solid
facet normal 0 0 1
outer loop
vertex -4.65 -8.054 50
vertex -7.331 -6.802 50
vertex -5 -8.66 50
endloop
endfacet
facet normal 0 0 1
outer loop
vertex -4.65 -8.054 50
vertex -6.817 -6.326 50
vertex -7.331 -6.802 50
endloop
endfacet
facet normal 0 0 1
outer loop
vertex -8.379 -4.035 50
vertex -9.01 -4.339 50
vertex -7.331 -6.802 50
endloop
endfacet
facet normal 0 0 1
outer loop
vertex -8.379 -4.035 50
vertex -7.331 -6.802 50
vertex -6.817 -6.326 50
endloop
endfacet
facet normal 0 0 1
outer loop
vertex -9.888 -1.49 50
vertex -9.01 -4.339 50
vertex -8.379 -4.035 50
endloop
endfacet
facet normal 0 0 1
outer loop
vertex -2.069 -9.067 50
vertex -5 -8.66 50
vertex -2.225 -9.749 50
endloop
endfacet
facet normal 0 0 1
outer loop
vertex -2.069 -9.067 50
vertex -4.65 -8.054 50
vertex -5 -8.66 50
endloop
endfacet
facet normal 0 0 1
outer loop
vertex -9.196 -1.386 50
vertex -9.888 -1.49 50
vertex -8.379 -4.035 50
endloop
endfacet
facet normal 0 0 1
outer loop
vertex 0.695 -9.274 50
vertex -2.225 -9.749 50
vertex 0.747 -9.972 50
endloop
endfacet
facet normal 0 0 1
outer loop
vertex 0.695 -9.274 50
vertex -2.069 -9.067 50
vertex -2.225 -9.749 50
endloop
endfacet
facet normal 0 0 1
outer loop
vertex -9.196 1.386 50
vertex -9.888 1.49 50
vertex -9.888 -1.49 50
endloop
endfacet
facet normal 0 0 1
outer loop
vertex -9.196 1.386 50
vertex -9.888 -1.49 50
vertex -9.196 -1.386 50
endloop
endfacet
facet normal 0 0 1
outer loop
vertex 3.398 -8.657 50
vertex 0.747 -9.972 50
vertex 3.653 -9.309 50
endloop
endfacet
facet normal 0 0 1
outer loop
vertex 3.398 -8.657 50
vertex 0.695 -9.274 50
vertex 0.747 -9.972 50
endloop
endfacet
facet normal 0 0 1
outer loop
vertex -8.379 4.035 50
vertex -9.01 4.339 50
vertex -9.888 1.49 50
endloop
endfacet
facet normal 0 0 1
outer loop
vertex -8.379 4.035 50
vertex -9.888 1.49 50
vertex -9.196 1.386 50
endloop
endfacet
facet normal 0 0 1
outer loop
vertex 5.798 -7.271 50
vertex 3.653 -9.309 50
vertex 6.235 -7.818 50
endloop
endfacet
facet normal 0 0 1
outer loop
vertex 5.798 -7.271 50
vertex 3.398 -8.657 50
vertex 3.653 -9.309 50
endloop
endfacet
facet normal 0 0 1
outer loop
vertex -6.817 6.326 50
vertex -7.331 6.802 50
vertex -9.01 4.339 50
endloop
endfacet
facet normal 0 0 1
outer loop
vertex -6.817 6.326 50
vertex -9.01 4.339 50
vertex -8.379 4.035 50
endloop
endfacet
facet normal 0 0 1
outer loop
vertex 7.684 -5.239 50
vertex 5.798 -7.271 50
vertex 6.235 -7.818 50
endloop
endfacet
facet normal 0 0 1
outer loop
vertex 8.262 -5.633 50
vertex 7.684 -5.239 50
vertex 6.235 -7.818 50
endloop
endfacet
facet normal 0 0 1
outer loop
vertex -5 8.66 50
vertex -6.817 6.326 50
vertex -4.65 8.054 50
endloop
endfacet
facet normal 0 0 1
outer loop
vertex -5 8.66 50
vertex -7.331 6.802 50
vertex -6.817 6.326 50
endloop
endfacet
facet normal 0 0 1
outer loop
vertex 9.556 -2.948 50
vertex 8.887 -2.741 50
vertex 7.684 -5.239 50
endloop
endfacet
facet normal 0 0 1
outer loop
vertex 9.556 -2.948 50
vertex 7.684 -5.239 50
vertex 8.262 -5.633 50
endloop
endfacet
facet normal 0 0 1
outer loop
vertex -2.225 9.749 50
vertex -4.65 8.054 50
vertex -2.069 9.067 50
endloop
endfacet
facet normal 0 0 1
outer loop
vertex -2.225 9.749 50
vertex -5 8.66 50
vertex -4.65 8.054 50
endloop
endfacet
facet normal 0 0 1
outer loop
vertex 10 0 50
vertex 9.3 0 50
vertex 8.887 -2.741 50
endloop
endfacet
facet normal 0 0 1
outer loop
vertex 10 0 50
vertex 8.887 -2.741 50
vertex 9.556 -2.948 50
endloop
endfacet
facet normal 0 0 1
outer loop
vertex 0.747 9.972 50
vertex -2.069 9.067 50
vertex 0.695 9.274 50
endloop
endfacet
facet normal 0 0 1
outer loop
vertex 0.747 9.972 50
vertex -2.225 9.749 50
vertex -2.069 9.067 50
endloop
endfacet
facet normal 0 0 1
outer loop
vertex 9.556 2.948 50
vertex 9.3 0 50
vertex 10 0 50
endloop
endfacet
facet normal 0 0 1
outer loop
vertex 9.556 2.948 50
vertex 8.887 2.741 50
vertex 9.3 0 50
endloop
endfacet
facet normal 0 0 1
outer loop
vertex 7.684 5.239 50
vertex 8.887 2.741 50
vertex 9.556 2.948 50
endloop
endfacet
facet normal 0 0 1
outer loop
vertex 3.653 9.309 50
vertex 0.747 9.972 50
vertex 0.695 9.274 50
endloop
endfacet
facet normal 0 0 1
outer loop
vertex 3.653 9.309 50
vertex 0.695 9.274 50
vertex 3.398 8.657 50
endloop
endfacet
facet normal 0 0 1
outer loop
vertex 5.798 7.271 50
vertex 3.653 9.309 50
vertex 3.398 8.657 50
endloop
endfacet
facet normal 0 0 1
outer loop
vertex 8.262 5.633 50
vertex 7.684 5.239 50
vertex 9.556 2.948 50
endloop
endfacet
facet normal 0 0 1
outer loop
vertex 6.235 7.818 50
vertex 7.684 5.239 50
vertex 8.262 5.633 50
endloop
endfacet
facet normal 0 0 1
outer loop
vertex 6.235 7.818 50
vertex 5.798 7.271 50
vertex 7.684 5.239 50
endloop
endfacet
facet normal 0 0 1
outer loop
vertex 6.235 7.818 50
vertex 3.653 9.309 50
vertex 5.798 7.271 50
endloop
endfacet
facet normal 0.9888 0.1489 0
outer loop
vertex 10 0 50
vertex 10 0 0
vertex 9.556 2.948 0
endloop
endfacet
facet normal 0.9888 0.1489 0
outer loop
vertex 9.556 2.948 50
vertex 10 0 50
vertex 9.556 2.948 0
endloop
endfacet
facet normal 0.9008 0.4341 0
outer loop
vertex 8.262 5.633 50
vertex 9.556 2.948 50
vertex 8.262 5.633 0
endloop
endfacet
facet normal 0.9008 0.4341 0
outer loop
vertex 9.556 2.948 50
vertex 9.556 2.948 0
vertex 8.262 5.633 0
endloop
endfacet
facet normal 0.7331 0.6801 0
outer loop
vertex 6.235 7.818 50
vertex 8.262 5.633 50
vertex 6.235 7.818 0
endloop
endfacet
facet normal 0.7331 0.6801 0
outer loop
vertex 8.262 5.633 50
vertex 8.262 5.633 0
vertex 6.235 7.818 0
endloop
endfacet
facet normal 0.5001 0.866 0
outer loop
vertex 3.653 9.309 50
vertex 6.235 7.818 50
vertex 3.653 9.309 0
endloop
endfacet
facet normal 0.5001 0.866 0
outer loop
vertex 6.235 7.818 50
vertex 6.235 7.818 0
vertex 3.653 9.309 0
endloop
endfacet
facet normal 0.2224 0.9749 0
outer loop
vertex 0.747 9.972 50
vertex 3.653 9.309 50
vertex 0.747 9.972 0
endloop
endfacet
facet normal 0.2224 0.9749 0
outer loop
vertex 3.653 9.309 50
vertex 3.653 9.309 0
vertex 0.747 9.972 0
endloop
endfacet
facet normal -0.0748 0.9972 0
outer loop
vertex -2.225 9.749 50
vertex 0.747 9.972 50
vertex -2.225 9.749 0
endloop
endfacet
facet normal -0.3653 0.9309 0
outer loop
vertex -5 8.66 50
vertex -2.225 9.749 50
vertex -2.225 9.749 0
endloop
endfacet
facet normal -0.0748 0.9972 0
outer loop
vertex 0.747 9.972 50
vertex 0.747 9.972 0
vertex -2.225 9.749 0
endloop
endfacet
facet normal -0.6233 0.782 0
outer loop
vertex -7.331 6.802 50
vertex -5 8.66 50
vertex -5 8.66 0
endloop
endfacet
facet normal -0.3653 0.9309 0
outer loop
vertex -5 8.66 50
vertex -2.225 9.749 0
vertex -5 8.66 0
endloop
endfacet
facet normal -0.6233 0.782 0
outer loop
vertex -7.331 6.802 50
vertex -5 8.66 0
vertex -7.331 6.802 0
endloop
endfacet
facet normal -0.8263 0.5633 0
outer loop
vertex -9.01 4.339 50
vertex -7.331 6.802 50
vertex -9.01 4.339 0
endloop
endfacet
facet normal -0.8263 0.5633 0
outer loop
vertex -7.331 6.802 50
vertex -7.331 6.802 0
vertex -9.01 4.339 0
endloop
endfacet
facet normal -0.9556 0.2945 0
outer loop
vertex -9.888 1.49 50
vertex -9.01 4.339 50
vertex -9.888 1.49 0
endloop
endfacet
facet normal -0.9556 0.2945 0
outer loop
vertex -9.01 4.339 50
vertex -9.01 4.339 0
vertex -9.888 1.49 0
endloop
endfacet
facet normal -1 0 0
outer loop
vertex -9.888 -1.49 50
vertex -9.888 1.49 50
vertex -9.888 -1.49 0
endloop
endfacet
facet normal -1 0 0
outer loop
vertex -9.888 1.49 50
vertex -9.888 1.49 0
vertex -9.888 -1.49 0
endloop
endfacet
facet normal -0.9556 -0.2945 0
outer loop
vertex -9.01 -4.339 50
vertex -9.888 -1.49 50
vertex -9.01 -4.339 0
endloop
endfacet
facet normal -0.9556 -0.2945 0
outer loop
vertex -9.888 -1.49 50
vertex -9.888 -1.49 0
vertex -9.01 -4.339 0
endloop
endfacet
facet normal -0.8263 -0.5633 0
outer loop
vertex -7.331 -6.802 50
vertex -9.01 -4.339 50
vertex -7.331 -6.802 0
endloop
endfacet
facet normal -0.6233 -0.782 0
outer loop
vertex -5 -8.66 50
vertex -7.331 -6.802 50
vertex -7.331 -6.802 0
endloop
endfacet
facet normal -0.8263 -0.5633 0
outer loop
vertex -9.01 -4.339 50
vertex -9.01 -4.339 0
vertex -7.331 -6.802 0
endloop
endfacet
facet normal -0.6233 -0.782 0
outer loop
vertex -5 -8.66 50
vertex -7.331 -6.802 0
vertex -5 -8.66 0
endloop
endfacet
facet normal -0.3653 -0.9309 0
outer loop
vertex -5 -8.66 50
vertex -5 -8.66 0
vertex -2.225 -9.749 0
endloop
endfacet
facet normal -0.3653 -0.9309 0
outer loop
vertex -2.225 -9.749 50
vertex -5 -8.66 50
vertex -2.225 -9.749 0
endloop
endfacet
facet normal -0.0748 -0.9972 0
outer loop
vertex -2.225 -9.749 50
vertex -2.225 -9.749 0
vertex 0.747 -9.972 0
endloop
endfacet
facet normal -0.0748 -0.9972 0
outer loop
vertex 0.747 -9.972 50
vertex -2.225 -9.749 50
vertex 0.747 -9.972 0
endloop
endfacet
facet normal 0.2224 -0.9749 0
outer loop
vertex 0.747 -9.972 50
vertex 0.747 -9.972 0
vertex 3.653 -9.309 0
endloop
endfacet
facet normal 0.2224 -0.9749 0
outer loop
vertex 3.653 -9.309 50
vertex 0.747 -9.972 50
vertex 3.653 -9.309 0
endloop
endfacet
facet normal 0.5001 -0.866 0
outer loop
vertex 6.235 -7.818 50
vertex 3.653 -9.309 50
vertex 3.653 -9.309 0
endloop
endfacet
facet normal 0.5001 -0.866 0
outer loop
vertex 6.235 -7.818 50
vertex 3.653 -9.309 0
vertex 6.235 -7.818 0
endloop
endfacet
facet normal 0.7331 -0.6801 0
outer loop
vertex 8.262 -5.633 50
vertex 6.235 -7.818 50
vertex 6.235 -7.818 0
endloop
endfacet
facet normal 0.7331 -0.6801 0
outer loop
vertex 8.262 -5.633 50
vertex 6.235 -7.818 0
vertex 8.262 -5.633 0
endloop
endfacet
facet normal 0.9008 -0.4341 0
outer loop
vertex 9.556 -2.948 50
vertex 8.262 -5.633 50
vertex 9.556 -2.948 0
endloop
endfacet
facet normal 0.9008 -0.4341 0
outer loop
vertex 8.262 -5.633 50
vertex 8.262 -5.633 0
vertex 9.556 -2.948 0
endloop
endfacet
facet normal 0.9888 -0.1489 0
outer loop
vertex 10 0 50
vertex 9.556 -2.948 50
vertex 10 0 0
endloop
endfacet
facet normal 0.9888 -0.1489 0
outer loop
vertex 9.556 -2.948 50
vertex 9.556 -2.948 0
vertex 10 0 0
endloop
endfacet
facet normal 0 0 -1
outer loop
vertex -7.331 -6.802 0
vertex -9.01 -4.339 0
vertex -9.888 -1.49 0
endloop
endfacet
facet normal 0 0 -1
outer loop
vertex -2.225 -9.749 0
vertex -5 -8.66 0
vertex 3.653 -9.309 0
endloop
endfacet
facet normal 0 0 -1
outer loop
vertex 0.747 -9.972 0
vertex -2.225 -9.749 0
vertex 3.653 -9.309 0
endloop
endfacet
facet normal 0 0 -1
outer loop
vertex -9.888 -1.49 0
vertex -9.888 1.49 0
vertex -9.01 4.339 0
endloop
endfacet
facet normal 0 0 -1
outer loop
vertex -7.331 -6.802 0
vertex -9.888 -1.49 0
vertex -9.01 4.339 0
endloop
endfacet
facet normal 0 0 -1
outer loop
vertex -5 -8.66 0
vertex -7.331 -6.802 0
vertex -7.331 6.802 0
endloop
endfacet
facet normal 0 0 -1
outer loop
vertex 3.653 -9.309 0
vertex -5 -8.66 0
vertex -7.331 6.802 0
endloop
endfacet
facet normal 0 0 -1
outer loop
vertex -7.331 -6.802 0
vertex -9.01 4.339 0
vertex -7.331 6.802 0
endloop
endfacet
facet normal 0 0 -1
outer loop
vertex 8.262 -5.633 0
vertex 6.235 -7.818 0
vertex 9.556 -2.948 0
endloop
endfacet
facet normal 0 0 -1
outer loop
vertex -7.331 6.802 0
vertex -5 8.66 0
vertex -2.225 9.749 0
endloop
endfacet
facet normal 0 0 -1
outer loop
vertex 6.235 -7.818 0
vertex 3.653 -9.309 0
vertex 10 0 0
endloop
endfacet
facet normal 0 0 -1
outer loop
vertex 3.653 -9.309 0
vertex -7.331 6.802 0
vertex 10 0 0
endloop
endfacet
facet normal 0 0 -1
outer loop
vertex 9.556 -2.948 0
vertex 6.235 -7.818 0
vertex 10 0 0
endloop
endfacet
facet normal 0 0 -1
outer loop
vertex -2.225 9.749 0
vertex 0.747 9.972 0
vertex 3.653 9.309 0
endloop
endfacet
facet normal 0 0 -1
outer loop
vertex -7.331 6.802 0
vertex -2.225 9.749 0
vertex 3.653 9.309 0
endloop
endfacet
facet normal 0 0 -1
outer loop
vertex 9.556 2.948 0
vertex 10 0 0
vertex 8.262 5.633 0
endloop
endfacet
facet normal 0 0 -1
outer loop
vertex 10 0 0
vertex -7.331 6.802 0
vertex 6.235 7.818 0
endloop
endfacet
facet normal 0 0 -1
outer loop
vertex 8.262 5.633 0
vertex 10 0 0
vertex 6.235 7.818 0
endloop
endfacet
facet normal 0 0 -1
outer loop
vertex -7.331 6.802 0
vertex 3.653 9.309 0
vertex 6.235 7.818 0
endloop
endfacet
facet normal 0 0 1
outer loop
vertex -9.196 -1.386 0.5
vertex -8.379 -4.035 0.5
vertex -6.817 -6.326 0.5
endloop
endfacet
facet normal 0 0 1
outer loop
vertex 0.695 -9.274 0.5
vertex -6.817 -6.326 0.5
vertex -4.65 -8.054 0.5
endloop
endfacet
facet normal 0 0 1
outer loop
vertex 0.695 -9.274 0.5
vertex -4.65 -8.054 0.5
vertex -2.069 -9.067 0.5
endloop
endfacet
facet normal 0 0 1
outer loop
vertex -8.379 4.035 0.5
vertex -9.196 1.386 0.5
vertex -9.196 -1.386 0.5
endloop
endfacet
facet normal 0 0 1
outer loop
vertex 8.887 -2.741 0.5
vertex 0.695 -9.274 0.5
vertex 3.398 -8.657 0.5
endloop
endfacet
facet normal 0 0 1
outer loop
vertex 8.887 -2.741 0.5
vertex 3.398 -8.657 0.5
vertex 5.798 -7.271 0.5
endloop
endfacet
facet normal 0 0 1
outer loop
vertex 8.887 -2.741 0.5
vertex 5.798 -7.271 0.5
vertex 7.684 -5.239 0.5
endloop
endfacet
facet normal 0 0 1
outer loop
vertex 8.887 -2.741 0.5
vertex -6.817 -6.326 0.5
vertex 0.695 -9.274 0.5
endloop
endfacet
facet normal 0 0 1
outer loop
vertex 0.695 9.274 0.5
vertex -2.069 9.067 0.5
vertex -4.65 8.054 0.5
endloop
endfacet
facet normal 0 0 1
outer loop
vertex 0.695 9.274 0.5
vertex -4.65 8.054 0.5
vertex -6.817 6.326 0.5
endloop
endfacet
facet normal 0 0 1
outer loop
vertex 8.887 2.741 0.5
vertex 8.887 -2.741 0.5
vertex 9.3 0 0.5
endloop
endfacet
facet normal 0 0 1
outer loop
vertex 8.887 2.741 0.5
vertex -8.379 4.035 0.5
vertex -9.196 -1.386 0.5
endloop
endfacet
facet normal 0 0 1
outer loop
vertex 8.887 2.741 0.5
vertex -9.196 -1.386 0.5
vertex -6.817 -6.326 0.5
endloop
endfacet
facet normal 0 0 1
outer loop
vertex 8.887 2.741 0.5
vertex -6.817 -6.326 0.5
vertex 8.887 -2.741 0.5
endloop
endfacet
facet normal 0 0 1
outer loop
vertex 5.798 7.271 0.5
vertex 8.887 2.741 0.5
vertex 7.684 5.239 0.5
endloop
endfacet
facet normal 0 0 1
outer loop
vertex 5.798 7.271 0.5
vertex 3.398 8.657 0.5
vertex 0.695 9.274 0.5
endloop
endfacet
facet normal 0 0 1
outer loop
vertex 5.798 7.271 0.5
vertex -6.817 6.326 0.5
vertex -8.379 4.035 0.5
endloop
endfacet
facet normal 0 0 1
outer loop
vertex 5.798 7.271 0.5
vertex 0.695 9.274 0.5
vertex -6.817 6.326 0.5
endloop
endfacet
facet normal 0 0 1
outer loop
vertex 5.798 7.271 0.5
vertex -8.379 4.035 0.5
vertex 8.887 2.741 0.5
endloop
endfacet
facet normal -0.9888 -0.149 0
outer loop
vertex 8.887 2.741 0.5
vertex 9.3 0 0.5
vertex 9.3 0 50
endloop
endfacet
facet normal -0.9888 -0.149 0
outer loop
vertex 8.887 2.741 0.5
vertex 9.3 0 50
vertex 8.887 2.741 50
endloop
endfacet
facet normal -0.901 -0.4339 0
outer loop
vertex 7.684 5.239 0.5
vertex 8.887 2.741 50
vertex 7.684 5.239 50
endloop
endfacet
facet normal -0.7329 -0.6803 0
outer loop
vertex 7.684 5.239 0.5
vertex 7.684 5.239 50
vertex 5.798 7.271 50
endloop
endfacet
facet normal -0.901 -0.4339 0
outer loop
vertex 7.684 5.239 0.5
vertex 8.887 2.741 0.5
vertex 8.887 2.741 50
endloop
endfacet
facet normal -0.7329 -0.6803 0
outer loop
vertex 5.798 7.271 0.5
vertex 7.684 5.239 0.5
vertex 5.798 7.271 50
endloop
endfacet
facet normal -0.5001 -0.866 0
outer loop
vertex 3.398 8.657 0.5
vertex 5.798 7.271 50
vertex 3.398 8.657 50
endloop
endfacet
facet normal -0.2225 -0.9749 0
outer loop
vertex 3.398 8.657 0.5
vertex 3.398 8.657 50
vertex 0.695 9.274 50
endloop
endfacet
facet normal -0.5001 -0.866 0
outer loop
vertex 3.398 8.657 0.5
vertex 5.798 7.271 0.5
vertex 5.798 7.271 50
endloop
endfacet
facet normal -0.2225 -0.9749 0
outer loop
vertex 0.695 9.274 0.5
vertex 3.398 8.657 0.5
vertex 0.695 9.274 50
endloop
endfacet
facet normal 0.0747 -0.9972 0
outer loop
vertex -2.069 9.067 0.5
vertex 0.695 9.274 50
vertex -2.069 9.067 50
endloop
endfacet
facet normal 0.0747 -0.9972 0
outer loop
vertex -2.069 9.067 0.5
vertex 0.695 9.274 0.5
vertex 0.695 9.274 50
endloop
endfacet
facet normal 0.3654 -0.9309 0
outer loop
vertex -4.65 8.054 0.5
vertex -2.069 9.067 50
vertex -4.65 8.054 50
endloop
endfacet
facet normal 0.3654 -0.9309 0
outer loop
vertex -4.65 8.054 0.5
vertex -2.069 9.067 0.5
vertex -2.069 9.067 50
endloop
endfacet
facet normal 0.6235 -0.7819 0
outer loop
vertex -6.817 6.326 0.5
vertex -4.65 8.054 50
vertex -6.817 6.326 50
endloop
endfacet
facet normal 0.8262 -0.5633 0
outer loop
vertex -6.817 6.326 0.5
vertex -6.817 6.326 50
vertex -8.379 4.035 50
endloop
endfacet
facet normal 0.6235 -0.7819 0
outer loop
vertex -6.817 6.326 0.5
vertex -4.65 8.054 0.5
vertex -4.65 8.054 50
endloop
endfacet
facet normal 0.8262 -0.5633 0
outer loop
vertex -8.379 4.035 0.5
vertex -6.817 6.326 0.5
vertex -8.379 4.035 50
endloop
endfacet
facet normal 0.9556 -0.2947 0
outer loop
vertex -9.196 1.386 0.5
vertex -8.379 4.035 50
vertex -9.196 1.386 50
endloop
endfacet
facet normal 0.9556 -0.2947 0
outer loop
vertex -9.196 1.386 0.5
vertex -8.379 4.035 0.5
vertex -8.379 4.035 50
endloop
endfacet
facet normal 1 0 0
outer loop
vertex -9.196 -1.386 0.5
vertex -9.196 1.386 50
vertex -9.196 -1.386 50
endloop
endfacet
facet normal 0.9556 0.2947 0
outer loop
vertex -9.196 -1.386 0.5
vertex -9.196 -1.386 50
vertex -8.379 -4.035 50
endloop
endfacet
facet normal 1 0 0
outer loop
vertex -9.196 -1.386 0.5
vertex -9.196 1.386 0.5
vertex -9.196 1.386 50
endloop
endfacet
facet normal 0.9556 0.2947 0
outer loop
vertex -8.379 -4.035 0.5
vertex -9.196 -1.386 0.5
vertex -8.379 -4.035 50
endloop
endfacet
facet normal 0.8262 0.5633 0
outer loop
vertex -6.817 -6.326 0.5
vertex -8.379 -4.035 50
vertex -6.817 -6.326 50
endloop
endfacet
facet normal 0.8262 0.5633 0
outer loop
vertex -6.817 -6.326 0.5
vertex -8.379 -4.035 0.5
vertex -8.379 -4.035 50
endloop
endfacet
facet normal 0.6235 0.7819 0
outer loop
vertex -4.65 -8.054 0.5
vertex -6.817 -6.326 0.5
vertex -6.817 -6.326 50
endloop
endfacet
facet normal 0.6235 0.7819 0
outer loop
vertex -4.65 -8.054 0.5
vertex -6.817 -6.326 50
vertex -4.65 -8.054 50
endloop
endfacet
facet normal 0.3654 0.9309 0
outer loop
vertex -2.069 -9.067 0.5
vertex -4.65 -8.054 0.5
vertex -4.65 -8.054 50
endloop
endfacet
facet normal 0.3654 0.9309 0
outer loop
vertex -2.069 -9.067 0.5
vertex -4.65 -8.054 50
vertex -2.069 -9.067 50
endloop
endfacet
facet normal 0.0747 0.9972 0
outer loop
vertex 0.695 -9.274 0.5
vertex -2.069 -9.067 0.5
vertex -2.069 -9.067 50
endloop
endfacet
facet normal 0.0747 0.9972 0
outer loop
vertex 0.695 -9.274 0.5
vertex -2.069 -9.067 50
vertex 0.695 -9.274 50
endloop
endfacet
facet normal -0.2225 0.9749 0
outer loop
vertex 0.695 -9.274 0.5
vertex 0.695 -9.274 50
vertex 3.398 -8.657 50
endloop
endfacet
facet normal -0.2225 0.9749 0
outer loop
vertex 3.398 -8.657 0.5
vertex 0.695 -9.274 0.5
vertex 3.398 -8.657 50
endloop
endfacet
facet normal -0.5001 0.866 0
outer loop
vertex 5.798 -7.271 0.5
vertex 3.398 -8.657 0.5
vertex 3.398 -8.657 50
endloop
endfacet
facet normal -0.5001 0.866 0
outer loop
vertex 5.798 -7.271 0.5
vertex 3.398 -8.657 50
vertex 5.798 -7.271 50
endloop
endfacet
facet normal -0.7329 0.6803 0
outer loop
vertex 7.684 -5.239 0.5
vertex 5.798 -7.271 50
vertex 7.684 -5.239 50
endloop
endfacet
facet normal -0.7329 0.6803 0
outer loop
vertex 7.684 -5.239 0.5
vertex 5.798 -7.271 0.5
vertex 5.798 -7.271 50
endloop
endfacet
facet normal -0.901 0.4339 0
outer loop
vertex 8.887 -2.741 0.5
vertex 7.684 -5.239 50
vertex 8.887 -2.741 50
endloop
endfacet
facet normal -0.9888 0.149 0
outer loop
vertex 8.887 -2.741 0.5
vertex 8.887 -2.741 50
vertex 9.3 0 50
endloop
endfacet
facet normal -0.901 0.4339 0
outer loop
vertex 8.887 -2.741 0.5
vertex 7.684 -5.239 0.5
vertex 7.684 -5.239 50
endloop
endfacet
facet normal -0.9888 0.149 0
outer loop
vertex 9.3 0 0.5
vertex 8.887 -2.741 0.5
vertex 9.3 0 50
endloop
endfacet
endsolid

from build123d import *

# Parameters (mm, degrees)
CYLINDER001_R     = 9.3
CYLINDER001_DEPTH = 49.5
CYLINDER_R        = 10
CYLINDER_DEPTH    = 50


with BuildPart() as cylinder001:
    # Cylinder001 → Cylinder001 (new body)
    with BuildSketch(Plane.XY.offset(0.5)):
        Circle(CYLINDER001_R)
    extrude(amount=CYLINDER001_DEPTH)


with BuildPart() as cut:
    # Cylinder → Cylinder (new body)
    with BuildSketch(Plane.XY):
        Circle(CYLINDER_R)
    extrude(amount=CYLINDER_DEPTH)

    # Cut: cut Cylinder001
    add(cylinder001.part, mode=Mode.SUBTRACT)


solid = cut.part
